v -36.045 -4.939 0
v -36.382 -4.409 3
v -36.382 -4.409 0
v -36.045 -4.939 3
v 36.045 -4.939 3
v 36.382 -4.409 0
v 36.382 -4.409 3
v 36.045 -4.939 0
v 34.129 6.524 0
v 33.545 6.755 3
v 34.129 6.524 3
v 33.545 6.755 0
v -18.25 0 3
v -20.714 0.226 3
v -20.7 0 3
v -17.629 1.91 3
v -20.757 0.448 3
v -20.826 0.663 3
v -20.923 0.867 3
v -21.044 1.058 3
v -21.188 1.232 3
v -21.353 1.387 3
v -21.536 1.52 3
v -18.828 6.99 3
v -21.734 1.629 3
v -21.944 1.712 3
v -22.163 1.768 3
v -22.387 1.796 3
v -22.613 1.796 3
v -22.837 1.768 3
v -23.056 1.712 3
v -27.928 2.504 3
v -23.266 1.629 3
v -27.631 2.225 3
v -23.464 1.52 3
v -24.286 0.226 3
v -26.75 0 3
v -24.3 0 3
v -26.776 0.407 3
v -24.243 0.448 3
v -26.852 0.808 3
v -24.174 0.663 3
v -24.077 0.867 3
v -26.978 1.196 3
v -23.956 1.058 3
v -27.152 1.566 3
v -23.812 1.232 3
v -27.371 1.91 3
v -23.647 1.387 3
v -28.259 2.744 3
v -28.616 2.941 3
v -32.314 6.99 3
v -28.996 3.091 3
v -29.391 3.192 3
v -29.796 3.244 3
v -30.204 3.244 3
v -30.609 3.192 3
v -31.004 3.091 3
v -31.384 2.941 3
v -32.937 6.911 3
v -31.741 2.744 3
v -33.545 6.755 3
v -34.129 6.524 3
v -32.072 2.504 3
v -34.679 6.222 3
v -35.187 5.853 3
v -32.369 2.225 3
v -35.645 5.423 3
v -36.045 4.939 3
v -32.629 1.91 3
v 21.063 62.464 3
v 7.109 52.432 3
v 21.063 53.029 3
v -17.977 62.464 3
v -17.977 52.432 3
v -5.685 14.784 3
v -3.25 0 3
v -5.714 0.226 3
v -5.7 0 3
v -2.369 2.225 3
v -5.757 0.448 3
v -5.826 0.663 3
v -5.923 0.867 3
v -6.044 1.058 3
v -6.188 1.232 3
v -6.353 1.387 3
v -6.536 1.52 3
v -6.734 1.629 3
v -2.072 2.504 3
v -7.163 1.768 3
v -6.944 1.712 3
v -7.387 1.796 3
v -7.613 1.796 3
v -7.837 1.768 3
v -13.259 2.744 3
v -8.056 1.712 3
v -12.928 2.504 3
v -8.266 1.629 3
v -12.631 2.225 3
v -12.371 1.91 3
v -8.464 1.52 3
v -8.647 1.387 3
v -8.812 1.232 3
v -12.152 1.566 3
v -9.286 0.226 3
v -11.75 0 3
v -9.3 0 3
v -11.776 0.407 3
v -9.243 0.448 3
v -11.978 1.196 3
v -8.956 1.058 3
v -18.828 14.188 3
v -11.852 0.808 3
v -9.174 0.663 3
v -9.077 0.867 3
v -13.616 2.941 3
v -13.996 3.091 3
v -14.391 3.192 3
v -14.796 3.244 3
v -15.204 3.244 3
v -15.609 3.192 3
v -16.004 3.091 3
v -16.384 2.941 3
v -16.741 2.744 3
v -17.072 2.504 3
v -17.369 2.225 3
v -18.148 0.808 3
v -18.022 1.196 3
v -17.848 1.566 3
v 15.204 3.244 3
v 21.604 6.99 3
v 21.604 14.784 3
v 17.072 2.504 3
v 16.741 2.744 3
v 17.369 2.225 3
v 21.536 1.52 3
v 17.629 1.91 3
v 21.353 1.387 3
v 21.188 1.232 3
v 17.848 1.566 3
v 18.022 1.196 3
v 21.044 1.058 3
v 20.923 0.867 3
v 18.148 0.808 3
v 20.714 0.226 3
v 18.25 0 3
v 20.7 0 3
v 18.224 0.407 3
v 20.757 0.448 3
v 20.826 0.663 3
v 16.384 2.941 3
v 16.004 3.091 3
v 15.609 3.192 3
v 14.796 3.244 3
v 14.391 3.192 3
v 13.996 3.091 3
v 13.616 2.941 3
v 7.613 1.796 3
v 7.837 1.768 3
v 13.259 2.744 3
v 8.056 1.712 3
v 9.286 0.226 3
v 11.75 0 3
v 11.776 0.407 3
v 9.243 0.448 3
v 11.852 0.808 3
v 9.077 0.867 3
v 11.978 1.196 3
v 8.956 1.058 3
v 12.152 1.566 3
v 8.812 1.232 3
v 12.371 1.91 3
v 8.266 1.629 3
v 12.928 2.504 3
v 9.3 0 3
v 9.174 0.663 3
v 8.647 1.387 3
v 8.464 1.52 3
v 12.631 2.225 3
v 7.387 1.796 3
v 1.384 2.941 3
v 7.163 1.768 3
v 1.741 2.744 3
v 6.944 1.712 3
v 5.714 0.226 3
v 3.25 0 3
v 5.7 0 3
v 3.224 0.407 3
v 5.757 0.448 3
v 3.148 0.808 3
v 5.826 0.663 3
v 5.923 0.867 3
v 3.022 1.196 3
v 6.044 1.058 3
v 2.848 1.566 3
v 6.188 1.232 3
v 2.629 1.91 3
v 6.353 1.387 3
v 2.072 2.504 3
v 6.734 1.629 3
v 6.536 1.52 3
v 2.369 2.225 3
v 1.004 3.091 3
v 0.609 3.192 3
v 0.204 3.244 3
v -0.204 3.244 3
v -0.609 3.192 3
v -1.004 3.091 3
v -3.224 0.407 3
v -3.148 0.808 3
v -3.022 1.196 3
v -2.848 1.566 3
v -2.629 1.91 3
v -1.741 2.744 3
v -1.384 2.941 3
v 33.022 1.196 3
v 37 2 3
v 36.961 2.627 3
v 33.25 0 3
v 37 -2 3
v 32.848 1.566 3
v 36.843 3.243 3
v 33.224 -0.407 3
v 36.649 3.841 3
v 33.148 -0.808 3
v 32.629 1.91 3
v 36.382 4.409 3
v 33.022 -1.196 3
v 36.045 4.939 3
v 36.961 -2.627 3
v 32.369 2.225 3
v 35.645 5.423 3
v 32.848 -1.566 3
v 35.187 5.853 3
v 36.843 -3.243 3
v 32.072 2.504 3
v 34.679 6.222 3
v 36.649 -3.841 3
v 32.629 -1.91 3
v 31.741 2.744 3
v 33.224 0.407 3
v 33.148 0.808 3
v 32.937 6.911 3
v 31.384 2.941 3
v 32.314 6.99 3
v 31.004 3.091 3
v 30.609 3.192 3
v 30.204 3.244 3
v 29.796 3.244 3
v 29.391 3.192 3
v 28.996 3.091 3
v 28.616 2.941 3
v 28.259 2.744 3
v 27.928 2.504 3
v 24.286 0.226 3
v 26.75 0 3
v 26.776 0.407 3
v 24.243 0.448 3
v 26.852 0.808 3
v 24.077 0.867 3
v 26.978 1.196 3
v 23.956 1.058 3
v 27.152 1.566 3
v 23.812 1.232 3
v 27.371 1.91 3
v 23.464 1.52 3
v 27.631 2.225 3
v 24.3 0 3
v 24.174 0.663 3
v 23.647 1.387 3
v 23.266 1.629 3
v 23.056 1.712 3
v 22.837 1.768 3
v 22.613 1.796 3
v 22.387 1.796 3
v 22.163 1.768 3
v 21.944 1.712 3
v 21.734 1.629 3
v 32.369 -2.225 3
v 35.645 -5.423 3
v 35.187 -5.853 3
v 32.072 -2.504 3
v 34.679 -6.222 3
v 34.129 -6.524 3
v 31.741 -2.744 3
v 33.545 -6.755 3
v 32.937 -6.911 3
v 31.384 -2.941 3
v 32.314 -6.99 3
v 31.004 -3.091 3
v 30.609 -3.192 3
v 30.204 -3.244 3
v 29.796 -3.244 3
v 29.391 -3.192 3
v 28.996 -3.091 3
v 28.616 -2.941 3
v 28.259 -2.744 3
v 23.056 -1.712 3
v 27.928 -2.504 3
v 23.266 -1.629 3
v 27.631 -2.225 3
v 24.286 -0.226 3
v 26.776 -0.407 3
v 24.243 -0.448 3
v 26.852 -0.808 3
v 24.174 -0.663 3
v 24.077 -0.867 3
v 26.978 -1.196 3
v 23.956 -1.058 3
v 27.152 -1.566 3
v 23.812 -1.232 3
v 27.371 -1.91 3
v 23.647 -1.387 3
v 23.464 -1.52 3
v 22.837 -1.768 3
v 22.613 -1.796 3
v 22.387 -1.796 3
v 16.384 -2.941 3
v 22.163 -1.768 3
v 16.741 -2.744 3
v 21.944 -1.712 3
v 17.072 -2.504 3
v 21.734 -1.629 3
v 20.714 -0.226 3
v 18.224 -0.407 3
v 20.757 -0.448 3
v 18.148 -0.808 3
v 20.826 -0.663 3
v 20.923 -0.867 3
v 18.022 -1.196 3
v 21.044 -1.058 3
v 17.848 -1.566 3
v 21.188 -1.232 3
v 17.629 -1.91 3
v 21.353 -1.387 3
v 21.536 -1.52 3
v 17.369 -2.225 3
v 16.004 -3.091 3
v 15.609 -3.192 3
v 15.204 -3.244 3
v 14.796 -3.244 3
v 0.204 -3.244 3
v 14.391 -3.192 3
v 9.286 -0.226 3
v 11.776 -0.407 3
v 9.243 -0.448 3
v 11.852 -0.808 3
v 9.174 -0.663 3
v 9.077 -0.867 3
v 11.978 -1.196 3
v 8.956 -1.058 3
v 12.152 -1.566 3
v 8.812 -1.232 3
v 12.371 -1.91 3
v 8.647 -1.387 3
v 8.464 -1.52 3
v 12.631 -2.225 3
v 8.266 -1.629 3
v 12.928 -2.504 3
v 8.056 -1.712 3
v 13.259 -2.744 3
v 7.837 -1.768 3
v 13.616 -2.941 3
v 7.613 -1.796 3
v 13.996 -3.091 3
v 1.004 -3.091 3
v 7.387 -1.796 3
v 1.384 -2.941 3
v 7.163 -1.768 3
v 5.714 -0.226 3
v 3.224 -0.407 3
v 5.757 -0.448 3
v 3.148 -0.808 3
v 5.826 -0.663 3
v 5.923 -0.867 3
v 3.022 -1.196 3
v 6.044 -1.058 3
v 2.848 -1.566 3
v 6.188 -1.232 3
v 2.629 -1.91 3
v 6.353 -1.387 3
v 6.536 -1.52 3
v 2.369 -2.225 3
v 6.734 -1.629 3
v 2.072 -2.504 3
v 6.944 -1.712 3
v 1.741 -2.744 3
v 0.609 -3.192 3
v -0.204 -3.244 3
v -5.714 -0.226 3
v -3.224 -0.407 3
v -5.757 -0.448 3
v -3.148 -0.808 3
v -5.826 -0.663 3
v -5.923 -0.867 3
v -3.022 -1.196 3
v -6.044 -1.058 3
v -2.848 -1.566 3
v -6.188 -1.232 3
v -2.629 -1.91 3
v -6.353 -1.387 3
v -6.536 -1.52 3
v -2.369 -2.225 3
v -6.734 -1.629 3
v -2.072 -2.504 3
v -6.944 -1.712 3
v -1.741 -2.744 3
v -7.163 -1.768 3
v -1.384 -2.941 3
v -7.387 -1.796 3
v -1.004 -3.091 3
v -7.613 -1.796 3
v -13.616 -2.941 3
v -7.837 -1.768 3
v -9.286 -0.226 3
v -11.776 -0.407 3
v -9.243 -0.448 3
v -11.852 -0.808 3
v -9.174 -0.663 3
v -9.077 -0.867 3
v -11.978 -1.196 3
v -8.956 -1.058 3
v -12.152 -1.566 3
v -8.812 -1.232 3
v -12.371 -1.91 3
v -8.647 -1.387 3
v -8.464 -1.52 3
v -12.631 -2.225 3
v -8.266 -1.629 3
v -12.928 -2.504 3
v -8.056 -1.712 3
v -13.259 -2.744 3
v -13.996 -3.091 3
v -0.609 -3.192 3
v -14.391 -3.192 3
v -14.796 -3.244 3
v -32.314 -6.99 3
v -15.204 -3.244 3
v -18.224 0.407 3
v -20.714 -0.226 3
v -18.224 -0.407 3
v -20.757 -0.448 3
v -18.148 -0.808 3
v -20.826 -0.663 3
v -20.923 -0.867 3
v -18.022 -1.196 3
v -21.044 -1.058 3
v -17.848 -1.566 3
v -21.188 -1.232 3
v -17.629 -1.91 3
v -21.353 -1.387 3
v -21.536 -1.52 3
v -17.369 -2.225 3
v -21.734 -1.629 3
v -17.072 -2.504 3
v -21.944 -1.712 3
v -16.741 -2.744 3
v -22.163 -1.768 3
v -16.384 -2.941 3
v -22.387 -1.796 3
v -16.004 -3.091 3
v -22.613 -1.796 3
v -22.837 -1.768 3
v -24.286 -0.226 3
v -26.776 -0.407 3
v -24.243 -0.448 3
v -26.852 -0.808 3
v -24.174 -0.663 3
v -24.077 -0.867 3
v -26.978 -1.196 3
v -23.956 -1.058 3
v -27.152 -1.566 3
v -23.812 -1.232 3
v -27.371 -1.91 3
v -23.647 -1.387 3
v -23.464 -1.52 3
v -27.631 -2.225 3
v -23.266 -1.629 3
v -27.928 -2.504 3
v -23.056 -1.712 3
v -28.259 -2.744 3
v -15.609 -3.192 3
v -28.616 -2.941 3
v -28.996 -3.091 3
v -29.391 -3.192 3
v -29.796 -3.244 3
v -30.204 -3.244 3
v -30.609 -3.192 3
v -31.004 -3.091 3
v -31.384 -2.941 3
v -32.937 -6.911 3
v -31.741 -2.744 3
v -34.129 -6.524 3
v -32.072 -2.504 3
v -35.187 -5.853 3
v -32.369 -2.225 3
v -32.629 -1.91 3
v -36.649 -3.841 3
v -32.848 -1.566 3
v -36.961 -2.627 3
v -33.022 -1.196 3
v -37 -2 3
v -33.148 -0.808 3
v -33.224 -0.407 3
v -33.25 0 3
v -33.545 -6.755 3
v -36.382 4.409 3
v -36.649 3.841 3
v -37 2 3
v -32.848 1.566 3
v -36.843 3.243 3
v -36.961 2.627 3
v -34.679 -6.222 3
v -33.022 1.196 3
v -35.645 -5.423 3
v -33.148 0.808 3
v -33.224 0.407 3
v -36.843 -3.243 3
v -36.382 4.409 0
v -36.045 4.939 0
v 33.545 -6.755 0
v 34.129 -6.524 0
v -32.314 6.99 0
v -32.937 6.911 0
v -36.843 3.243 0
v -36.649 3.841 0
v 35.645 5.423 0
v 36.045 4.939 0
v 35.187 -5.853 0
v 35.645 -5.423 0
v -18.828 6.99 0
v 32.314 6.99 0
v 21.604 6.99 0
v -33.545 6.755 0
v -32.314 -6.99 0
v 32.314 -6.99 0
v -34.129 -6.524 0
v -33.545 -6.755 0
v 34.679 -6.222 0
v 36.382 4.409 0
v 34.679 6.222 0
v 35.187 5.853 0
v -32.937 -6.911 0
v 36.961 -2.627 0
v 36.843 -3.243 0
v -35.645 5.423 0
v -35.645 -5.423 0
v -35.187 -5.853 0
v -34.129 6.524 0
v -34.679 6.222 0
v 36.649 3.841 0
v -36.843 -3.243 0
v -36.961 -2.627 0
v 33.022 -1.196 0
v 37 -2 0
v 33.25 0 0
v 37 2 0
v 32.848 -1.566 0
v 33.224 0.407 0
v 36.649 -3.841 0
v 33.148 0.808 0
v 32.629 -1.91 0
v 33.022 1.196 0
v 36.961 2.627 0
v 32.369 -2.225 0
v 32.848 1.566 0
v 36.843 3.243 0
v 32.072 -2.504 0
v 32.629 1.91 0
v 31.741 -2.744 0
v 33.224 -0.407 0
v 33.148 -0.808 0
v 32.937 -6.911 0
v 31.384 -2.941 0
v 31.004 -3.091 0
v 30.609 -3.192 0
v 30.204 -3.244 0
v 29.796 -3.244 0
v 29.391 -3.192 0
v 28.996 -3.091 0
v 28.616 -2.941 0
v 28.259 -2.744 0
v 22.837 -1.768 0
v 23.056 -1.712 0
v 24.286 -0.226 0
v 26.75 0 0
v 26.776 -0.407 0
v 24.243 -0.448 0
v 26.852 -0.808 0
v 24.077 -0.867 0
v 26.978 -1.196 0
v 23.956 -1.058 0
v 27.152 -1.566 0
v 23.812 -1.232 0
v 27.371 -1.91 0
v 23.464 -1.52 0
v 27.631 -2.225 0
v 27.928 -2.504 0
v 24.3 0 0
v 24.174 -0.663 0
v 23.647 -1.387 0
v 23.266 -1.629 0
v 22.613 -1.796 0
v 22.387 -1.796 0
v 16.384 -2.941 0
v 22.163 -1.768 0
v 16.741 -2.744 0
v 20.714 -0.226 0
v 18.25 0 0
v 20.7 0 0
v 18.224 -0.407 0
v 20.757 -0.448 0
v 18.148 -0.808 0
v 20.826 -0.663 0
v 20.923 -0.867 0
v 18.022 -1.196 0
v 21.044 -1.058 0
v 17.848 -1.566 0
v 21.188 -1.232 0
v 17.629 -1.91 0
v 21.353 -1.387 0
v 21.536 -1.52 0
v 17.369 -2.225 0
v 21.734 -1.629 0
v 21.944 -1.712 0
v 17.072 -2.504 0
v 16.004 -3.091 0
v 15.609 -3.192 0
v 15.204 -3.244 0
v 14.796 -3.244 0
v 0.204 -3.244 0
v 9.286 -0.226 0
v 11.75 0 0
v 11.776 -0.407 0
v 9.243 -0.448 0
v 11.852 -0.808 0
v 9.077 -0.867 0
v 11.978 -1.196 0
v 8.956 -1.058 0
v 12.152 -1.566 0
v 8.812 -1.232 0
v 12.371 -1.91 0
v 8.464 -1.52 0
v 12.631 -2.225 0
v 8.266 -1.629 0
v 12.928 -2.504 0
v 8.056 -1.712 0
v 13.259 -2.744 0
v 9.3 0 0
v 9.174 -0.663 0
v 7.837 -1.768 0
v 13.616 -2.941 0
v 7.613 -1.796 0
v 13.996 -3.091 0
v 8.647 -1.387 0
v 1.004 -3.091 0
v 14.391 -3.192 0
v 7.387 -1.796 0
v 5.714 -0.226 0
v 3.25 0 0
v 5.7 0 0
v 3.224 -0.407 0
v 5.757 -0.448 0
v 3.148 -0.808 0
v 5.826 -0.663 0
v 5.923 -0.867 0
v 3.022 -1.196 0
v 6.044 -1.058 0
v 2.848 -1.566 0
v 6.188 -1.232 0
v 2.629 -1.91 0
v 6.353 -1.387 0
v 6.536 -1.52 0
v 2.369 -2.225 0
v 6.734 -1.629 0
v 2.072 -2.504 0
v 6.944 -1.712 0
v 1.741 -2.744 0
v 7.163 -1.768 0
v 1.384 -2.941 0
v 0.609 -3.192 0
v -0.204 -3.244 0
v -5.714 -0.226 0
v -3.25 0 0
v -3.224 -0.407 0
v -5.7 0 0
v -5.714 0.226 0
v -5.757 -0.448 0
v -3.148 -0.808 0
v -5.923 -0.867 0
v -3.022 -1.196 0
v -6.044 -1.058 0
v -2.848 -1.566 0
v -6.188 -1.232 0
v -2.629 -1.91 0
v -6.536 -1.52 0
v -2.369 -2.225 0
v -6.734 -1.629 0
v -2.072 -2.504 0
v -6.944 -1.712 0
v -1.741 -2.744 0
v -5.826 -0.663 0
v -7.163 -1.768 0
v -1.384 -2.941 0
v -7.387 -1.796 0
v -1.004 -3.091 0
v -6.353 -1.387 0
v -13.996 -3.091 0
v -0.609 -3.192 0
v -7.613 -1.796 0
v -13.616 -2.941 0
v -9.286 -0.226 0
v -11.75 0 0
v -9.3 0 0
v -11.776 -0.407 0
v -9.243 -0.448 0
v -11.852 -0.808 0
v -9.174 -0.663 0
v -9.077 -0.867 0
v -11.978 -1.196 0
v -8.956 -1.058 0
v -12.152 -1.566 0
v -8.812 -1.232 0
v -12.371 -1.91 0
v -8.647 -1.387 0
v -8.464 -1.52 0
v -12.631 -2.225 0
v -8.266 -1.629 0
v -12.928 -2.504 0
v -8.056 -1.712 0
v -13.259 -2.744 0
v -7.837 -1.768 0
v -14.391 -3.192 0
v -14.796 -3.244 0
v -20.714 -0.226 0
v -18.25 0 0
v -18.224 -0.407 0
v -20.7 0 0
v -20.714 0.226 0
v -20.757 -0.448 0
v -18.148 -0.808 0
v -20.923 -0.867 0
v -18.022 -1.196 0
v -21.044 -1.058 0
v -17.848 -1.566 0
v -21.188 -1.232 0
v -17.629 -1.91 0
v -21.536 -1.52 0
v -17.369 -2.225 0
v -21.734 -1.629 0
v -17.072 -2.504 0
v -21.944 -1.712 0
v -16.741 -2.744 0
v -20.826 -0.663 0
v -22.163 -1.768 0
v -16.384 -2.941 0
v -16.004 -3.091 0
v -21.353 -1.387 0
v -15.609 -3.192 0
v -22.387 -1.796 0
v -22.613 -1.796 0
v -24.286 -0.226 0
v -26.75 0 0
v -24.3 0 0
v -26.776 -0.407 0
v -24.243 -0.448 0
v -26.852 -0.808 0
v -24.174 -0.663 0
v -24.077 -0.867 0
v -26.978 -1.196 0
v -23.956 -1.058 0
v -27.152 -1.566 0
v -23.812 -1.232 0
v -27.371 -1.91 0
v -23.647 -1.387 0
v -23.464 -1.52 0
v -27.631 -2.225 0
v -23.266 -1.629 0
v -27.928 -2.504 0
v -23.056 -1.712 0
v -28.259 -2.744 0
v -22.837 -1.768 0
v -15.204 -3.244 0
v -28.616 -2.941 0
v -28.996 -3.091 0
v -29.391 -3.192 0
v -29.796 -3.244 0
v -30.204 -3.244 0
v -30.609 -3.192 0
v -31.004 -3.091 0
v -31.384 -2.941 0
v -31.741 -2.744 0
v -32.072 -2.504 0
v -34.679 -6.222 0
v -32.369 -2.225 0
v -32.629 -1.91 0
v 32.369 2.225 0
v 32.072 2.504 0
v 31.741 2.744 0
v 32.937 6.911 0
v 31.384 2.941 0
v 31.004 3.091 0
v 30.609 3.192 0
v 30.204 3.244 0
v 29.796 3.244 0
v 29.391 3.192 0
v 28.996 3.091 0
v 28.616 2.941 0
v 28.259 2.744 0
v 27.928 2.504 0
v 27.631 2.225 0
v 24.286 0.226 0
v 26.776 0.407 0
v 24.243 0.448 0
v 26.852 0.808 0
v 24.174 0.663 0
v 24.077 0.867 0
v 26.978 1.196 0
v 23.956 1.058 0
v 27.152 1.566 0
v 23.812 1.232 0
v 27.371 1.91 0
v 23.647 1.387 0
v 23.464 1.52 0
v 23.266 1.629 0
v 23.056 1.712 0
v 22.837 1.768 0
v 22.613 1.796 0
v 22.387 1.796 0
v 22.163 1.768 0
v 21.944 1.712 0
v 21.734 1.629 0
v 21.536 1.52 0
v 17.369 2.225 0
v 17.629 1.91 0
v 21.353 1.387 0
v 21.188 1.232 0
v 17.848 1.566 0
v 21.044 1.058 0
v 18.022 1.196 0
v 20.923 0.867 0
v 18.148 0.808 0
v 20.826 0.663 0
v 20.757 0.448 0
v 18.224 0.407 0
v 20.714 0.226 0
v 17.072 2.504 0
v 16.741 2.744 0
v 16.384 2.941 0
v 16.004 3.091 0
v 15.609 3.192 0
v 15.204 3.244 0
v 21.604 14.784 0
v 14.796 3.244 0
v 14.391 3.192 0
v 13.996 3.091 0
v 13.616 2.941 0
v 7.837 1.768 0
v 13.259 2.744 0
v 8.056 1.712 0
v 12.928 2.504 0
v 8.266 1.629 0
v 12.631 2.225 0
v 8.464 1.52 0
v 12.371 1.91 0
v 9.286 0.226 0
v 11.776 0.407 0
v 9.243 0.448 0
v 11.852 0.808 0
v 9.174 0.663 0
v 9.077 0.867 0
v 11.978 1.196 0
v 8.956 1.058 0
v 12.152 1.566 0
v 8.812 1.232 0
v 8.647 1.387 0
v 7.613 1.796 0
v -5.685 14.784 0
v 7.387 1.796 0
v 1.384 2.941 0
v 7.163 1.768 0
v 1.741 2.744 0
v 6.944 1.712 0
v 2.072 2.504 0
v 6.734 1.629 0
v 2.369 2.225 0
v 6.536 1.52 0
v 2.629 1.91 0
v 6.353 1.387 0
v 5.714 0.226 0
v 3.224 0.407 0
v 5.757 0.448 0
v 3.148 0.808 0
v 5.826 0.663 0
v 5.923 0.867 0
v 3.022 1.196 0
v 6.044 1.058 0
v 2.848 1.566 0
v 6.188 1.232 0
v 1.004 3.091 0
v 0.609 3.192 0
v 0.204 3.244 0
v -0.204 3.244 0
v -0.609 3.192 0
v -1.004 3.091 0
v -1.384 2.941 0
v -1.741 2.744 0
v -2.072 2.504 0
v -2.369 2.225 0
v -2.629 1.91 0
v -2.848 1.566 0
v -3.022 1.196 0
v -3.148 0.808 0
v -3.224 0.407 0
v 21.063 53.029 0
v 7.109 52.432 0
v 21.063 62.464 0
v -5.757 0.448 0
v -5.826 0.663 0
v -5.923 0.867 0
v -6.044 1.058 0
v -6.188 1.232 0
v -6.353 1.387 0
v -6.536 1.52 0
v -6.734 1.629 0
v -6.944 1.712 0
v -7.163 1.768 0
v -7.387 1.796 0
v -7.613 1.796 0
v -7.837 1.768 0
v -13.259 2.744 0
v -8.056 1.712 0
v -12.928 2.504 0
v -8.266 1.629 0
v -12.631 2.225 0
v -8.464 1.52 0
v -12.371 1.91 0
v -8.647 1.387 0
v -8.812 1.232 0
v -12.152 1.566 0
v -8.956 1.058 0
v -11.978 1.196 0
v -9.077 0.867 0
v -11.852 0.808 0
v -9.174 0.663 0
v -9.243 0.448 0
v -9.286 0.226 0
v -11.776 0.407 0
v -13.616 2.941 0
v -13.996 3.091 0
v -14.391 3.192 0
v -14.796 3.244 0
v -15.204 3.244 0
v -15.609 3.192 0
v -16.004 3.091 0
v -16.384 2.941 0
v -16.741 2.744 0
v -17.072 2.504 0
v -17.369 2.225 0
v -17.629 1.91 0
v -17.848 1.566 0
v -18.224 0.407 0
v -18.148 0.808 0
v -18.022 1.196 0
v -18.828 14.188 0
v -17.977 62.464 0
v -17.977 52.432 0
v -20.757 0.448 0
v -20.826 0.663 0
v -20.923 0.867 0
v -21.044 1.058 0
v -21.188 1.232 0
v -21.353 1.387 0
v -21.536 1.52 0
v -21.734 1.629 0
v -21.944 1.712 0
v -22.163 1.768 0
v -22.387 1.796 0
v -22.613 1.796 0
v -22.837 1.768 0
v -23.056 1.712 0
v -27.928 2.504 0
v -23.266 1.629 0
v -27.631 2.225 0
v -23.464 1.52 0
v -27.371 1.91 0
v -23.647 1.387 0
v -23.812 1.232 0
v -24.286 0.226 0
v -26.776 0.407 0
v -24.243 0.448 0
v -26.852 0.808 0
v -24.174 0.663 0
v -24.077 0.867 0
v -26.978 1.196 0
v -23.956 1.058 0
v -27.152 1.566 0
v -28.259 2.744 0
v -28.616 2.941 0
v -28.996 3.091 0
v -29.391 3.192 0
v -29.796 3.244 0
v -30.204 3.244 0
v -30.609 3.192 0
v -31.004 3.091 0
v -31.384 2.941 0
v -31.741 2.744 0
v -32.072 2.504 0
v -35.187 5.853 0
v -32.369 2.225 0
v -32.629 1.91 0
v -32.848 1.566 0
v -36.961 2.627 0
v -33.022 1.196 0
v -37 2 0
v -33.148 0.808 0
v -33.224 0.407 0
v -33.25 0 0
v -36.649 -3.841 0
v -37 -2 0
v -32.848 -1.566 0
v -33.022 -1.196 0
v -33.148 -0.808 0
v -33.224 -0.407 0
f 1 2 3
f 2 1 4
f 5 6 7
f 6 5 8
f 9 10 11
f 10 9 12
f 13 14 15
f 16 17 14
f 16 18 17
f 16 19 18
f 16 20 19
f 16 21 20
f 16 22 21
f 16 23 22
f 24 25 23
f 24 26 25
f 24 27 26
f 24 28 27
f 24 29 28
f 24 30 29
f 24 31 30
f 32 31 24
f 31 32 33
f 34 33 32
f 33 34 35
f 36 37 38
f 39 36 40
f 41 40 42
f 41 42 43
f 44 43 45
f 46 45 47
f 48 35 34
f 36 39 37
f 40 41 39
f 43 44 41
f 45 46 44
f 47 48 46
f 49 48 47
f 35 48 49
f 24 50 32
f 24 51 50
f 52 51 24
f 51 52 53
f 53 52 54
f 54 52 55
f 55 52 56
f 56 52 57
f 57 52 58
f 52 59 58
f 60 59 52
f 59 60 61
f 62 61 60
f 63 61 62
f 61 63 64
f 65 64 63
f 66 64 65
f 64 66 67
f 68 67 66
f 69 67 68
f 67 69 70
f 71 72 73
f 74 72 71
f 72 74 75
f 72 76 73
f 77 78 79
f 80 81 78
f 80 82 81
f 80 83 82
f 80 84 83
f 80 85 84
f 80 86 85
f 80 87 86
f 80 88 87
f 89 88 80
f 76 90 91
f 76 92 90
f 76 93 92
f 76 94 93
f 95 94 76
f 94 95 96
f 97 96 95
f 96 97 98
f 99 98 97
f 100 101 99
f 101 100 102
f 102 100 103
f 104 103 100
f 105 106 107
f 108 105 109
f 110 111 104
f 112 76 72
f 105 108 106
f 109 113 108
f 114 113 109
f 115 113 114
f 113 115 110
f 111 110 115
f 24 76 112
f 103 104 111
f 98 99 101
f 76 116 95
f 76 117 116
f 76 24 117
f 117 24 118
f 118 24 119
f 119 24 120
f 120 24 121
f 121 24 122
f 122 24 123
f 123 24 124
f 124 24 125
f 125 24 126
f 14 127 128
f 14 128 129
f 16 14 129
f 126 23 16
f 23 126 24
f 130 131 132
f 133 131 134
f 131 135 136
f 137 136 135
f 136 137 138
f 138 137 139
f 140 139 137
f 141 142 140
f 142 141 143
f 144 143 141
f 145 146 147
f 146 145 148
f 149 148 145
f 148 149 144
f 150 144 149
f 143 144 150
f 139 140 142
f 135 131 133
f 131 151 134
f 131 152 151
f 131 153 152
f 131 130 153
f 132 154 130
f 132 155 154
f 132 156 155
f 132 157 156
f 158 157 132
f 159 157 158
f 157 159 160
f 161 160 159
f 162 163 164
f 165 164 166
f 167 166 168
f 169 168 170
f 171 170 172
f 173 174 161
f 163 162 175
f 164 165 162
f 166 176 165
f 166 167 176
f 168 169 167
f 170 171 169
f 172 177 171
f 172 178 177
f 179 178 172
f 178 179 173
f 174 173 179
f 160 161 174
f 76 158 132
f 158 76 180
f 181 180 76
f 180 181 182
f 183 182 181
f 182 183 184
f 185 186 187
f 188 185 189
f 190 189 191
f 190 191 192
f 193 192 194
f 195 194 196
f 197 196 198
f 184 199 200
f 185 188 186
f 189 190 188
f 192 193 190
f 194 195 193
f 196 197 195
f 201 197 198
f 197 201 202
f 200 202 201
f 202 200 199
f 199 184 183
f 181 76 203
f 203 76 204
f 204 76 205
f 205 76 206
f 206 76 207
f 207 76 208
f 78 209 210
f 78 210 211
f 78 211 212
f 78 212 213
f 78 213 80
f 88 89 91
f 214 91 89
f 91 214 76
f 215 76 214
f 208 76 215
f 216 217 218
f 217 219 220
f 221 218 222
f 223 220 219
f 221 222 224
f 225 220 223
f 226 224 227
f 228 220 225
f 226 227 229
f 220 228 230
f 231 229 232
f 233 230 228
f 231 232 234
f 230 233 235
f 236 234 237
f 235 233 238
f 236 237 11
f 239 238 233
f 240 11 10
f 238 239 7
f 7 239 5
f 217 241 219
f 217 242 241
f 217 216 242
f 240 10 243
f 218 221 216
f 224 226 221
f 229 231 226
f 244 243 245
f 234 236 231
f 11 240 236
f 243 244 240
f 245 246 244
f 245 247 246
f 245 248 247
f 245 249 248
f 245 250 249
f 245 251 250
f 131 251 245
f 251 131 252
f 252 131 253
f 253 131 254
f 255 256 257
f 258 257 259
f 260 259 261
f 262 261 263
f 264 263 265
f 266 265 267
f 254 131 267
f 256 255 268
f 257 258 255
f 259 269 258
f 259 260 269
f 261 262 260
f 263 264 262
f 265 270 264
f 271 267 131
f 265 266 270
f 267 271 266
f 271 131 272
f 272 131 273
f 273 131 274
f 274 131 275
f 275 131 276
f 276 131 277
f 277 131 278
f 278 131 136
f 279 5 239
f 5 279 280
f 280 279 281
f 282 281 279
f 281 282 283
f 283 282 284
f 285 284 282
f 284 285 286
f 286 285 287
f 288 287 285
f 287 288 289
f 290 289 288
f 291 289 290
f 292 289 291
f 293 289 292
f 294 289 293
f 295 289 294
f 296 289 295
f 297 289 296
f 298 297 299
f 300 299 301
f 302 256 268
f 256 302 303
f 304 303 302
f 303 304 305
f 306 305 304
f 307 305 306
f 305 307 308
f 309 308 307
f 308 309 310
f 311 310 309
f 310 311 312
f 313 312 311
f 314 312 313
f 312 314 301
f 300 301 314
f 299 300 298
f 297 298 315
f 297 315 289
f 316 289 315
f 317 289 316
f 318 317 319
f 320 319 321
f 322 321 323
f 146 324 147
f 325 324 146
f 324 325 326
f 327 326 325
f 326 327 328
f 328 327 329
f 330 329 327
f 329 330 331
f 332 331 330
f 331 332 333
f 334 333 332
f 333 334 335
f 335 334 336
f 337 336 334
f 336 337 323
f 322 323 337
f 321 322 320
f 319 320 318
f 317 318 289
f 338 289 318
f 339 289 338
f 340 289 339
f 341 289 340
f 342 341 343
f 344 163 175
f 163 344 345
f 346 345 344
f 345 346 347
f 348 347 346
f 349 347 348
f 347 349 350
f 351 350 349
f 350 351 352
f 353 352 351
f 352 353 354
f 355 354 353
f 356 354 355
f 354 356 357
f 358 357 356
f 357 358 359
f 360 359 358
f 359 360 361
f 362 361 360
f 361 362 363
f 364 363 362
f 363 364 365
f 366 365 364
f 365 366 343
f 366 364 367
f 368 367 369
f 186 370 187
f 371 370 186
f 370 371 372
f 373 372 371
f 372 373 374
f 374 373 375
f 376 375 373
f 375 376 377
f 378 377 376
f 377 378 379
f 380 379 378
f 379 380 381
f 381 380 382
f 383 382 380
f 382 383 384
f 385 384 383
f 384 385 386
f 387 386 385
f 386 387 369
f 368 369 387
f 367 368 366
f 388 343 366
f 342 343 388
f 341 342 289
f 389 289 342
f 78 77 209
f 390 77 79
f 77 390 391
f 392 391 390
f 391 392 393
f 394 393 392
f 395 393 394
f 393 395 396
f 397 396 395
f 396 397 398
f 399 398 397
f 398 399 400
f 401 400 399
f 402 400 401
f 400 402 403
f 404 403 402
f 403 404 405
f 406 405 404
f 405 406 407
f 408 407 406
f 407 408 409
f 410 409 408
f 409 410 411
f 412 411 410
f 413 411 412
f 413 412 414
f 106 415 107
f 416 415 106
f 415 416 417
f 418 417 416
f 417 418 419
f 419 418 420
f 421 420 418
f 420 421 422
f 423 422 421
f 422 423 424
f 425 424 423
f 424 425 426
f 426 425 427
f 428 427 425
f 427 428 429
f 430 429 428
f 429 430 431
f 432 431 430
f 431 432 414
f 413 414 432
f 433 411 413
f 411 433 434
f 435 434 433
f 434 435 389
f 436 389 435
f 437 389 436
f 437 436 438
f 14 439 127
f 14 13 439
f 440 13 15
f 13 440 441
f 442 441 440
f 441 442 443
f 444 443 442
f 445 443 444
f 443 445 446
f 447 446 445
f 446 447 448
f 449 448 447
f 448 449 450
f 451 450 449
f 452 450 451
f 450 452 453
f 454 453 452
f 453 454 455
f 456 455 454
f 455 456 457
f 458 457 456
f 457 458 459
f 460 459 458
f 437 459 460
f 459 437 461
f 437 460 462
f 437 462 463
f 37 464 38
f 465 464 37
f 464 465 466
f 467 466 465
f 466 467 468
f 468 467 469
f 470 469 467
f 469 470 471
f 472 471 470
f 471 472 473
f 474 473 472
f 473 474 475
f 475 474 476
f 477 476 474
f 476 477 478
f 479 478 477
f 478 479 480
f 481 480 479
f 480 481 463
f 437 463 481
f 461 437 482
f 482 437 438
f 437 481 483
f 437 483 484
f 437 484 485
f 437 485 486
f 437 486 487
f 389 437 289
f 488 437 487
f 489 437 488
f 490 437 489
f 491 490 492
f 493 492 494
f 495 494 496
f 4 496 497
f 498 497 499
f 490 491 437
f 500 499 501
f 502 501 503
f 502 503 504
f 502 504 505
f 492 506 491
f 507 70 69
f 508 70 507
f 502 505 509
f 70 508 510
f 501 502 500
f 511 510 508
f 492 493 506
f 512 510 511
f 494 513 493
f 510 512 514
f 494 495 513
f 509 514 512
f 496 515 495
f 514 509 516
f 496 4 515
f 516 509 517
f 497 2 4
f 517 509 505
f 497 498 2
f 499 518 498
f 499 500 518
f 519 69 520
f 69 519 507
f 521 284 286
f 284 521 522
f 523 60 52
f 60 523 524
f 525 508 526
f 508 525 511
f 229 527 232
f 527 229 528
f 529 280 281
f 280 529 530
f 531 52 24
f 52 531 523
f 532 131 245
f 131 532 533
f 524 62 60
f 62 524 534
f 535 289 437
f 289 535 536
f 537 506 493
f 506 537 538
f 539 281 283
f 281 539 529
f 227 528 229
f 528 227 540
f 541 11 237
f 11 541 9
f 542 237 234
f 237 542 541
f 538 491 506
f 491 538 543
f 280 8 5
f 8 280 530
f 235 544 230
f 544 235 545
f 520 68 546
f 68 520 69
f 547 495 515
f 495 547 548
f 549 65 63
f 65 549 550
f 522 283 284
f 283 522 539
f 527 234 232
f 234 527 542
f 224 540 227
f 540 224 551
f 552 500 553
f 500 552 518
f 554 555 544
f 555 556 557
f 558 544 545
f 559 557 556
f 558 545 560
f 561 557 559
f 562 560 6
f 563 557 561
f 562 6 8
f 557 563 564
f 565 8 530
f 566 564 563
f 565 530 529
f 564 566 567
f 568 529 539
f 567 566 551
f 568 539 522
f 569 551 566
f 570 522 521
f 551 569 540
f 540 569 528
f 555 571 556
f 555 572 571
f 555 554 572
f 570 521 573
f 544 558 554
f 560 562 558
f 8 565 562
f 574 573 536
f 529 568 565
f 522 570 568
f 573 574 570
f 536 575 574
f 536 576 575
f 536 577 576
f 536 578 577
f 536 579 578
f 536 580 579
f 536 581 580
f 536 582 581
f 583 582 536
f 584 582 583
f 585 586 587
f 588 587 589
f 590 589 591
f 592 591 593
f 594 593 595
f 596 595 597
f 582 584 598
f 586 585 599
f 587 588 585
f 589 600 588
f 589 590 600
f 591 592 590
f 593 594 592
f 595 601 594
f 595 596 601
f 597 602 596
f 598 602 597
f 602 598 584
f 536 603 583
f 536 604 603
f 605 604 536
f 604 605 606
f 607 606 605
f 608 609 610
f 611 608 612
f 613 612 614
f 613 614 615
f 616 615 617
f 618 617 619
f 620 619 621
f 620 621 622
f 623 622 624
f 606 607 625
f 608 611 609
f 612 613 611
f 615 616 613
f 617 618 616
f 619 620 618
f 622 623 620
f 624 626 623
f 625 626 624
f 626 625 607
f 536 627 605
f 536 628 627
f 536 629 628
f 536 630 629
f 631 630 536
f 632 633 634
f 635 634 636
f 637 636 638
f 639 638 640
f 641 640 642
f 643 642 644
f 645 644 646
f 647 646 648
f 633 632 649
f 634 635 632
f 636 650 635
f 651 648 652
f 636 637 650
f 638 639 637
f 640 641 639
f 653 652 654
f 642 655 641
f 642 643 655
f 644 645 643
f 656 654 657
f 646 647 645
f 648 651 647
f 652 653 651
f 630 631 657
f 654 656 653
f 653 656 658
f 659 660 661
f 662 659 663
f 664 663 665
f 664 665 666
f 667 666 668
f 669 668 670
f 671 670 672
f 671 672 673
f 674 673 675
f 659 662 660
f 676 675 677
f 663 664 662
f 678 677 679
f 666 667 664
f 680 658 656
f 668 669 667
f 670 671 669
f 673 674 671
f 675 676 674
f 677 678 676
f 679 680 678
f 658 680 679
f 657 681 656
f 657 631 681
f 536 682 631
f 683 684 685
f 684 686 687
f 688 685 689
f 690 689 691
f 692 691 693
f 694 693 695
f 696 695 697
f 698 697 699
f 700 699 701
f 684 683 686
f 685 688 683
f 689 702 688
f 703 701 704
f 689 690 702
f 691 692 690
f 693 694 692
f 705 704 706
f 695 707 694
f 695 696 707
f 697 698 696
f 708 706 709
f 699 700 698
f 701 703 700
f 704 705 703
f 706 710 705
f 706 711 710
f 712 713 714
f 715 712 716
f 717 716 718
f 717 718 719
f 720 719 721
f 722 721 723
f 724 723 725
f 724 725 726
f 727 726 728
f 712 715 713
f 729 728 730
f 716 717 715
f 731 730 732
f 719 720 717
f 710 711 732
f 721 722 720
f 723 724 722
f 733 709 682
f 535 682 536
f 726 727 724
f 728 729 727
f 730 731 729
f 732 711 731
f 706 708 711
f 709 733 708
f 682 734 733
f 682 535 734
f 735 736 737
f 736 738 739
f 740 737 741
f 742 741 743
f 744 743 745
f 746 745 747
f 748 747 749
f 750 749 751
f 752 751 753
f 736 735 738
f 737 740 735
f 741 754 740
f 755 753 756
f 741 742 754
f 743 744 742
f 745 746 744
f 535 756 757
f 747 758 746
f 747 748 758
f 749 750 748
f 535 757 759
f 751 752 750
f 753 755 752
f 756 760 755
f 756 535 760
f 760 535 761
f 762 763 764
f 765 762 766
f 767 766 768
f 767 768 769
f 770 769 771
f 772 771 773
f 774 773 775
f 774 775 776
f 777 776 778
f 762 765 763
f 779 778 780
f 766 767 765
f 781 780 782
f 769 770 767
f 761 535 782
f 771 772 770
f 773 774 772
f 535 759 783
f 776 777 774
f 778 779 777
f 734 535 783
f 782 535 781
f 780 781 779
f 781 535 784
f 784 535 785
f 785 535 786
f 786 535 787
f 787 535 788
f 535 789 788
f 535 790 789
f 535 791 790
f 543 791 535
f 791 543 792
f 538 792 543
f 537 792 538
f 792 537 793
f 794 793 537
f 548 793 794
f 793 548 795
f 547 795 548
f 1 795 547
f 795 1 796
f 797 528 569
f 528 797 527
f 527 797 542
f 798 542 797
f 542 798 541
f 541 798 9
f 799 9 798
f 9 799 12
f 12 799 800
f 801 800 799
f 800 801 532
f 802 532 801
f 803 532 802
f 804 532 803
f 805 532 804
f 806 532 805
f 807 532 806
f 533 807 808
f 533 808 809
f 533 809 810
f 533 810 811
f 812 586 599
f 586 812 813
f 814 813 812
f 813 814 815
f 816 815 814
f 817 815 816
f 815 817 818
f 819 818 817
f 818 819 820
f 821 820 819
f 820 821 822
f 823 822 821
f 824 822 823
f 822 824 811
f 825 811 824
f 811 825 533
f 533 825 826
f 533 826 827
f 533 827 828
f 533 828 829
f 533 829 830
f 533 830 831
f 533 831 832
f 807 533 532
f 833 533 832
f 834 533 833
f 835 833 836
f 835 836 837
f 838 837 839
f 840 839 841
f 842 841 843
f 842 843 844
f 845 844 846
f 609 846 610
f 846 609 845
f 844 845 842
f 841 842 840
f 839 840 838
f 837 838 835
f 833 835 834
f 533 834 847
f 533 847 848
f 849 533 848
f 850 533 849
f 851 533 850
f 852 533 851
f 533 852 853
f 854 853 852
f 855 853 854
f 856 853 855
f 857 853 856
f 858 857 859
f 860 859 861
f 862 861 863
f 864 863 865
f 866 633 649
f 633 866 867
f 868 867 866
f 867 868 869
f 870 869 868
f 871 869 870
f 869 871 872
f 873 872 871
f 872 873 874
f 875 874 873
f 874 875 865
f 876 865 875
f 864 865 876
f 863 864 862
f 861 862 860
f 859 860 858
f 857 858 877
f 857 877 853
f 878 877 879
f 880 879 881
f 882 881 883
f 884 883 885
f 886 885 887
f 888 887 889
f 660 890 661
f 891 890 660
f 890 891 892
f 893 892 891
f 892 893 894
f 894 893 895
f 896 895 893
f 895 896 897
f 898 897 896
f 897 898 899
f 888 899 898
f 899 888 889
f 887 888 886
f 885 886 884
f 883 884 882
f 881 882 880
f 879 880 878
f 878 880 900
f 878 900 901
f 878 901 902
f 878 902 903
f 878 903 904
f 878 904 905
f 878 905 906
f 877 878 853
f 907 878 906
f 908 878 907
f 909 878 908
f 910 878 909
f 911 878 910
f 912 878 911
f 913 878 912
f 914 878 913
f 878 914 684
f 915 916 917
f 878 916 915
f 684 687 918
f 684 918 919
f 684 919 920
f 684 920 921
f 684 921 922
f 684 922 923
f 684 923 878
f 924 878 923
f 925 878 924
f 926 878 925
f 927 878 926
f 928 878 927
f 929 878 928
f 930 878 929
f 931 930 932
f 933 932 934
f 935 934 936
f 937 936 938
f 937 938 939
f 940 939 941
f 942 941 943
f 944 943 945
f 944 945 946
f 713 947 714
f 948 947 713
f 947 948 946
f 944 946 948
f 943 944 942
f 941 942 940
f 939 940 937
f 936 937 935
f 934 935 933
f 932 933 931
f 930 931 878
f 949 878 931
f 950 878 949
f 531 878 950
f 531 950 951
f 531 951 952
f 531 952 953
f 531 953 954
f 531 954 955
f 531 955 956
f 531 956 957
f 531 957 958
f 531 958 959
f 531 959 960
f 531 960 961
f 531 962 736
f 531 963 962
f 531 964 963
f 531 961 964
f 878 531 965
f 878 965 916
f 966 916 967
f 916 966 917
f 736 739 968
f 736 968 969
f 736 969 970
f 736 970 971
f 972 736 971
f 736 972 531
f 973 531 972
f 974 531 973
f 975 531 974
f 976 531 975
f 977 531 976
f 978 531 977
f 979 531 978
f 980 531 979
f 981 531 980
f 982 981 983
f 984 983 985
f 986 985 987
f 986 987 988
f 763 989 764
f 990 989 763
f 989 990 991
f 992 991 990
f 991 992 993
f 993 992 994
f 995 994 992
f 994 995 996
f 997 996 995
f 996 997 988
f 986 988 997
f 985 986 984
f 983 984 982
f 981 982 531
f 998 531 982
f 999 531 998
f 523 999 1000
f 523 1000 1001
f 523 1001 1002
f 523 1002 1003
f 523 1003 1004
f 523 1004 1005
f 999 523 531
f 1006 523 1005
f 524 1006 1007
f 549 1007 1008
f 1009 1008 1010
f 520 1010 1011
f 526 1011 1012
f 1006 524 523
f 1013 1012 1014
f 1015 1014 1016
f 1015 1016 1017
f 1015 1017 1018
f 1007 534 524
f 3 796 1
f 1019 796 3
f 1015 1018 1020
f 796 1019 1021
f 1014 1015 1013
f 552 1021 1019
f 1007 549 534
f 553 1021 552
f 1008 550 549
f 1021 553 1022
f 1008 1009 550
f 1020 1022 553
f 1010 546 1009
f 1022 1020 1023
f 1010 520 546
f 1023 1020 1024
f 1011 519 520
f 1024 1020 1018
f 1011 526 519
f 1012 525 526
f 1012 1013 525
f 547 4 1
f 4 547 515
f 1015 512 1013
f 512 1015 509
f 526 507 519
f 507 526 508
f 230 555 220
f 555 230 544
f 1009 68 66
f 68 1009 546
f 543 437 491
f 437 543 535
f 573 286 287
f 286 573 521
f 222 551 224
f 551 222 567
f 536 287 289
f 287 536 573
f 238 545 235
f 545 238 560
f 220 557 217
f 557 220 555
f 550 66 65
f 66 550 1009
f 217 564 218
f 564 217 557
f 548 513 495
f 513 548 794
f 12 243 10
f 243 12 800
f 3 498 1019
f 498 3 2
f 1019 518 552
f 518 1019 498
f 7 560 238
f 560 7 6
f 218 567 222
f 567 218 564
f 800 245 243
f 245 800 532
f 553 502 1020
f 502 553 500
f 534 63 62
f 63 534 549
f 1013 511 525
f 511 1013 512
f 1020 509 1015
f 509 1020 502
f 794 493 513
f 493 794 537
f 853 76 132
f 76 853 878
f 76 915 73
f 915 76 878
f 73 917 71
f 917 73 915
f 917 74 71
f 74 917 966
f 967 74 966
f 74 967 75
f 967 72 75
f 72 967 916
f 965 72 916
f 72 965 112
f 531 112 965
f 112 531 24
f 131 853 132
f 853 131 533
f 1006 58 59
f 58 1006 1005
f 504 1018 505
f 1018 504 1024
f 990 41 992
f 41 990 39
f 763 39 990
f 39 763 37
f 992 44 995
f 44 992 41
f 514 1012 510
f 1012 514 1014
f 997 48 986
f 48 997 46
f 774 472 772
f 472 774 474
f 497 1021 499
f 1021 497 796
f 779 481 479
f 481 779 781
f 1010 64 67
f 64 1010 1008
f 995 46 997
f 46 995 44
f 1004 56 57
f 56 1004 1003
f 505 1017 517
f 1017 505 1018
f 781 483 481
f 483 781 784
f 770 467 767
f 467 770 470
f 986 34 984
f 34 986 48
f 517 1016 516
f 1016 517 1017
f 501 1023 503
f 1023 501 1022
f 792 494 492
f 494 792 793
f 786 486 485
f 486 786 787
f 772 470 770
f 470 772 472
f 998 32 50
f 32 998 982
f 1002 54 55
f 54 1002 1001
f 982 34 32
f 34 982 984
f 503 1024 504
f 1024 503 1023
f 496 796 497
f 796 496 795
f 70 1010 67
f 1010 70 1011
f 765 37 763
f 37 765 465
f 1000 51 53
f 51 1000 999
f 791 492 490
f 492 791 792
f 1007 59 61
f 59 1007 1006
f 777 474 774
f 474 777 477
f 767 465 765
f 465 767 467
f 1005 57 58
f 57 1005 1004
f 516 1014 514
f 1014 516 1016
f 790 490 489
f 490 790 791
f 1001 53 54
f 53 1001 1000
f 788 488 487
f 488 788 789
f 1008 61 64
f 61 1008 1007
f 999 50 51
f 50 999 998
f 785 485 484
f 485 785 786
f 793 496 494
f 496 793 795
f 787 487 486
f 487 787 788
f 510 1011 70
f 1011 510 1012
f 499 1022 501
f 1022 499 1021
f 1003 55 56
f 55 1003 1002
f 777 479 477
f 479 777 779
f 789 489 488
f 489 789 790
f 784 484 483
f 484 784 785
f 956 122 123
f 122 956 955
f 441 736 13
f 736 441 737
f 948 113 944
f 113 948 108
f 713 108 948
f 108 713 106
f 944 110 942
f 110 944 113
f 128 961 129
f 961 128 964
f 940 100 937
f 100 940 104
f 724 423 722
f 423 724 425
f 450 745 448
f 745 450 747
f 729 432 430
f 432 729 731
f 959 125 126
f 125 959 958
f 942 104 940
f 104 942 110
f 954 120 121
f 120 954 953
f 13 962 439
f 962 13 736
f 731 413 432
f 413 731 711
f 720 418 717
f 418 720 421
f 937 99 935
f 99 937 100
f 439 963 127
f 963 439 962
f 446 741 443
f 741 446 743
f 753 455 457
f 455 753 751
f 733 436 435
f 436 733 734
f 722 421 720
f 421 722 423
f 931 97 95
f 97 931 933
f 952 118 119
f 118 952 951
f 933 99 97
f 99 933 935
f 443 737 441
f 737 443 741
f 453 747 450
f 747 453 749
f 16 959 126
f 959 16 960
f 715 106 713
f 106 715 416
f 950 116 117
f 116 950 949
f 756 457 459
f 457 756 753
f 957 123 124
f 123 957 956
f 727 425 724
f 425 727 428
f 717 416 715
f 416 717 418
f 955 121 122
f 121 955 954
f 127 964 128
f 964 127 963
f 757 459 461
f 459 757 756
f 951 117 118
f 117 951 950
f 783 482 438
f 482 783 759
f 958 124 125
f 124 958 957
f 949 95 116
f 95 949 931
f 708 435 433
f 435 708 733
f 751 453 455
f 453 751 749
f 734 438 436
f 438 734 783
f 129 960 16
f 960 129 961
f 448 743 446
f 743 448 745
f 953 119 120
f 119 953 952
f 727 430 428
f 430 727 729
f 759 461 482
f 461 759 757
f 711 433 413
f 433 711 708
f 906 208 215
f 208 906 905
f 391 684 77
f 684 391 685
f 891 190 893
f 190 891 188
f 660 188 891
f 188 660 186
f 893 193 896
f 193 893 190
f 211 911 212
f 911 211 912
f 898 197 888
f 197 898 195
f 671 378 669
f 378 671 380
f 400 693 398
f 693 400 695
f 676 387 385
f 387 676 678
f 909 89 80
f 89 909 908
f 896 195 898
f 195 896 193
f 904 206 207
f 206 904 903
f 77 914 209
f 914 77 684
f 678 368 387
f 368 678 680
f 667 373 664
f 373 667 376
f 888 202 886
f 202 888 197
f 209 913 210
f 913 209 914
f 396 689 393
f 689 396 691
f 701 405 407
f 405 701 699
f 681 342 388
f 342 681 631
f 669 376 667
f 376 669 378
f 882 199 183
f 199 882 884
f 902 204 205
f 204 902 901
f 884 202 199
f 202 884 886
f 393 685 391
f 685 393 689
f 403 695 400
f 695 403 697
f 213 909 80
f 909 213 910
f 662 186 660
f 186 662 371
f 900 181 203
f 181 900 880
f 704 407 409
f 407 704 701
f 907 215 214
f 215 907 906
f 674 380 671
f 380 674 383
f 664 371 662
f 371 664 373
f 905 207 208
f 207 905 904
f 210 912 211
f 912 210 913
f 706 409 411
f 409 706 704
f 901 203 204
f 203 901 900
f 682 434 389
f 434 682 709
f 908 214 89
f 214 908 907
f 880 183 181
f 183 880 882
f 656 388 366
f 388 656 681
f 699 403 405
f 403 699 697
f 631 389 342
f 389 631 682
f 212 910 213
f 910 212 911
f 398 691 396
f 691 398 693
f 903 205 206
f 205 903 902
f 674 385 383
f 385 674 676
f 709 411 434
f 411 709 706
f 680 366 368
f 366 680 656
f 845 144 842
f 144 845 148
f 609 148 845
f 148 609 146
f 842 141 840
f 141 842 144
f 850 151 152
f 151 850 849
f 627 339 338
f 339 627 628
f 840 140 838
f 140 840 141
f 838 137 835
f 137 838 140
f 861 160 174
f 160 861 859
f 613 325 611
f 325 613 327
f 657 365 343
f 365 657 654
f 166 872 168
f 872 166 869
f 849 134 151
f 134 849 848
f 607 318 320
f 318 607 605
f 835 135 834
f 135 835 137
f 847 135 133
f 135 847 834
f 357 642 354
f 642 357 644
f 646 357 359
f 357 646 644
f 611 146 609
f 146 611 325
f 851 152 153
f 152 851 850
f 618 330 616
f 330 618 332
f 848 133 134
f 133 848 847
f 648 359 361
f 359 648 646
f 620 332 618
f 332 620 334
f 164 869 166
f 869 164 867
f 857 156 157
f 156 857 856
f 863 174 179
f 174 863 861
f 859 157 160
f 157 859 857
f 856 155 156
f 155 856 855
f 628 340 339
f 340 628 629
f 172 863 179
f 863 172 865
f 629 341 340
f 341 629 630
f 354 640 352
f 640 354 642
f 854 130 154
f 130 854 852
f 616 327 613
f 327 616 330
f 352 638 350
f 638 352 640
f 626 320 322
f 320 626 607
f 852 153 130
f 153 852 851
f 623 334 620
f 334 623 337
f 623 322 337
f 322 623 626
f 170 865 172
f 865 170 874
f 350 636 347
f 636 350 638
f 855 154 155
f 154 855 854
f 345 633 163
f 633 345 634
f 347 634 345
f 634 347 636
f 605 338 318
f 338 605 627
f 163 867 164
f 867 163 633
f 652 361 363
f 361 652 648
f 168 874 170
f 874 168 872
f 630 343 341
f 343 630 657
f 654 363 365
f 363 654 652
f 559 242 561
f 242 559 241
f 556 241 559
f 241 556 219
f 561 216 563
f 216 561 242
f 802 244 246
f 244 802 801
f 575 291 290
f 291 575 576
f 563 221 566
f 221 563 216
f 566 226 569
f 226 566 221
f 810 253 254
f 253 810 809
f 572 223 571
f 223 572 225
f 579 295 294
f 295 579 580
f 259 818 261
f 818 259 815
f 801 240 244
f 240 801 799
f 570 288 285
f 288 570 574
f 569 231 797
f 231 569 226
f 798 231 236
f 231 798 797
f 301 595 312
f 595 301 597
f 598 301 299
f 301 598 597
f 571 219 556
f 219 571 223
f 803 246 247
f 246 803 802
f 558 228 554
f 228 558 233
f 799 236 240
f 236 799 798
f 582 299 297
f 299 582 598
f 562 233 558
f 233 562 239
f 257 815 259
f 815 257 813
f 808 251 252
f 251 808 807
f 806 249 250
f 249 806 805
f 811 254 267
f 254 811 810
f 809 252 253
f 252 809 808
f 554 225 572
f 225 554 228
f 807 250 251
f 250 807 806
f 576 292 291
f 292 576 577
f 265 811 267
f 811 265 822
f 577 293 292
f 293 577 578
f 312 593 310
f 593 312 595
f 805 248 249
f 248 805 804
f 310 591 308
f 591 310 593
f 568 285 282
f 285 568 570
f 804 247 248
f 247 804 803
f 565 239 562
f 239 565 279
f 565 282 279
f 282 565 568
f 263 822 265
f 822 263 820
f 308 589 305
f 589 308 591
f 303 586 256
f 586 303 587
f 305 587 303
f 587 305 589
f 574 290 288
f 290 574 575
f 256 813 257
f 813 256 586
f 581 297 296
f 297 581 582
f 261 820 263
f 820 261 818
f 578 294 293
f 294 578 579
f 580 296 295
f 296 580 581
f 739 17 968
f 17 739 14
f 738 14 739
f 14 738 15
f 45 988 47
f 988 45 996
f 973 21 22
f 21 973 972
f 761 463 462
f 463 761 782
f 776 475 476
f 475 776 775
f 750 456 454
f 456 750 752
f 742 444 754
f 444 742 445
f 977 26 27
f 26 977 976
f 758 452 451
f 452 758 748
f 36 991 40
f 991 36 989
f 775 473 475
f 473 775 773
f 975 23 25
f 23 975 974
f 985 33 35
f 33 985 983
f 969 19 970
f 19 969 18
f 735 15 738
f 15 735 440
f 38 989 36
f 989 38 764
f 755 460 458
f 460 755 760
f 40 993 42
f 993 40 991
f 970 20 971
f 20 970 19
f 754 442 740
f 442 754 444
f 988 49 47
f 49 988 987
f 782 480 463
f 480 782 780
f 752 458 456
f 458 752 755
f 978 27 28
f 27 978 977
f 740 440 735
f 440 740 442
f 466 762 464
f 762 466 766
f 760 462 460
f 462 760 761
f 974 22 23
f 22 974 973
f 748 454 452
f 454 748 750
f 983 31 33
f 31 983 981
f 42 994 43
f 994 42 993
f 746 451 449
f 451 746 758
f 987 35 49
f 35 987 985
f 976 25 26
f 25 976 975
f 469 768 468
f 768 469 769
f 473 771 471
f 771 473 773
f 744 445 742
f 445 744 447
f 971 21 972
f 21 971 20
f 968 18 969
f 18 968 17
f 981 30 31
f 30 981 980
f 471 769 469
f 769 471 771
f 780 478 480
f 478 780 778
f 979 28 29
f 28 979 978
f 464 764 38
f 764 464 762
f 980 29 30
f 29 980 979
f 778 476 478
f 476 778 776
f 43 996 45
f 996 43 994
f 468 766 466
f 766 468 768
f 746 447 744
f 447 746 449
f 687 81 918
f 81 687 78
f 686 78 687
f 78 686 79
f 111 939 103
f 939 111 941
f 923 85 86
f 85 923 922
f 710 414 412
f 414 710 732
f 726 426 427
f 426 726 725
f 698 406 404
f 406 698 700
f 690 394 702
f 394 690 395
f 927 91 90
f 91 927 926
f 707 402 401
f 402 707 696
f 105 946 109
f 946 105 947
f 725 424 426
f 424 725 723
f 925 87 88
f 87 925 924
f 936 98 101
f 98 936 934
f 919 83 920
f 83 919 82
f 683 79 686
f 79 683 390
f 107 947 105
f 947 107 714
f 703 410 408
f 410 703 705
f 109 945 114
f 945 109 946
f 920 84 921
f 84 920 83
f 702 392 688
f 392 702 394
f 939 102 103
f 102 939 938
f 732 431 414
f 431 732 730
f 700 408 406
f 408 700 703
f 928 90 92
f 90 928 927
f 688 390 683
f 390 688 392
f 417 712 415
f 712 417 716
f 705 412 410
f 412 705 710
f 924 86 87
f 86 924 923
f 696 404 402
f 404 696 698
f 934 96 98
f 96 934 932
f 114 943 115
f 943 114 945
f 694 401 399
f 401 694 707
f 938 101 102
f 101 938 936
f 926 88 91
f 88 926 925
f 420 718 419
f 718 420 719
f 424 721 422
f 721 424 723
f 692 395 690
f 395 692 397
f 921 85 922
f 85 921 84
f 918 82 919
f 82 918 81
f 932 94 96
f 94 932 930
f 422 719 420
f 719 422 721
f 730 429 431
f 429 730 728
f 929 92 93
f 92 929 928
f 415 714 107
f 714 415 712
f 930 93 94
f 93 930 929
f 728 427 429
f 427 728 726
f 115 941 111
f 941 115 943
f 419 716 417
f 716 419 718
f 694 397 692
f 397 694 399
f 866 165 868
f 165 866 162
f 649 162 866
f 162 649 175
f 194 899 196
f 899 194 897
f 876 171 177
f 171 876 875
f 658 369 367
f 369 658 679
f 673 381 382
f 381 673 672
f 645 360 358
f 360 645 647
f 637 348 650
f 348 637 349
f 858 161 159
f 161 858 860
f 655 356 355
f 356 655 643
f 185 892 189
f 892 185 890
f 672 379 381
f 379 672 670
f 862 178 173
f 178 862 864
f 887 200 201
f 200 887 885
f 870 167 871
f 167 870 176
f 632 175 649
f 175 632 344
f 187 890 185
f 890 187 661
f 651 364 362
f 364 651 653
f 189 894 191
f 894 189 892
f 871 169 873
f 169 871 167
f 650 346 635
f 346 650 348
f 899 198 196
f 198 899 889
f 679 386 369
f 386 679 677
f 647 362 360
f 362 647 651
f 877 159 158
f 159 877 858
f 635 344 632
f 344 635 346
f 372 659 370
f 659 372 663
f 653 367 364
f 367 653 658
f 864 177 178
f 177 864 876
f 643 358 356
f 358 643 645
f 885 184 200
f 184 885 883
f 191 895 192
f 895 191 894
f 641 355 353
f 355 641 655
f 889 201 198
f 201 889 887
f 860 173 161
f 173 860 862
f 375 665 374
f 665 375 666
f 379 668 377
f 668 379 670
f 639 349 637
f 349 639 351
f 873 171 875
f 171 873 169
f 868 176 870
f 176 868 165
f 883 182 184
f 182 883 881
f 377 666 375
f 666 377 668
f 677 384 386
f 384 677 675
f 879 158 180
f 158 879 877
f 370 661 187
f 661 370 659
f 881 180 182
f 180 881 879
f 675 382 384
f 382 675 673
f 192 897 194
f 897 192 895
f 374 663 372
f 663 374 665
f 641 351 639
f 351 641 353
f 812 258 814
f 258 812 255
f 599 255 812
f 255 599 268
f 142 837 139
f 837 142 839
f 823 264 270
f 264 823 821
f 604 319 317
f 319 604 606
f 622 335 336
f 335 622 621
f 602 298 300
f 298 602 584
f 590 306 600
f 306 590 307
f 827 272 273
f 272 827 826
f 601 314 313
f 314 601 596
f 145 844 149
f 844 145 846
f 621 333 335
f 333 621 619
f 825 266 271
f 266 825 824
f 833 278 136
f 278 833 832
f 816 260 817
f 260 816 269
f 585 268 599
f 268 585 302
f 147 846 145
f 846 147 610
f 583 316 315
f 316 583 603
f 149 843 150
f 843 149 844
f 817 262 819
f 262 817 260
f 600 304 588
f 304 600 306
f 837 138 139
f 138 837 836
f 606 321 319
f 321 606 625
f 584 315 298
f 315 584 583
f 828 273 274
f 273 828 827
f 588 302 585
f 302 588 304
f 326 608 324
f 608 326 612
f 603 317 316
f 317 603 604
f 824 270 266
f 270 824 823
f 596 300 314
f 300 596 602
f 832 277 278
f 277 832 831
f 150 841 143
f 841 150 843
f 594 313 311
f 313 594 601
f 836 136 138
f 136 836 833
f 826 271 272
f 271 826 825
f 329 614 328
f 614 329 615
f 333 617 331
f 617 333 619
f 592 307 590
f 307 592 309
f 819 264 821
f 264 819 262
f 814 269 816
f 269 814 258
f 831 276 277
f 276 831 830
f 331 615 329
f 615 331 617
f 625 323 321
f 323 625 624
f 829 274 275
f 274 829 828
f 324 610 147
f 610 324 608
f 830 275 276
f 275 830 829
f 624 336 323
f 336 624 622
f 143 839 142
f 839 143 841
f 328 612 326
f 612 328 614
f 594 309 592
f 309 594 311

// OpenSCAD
$fn = 50;


difference() {
	union() {
		hull() {
			translate(v = [-32.0000000000, 2.0000000000, 0]) {
				cylinder(h = 3, r = 5);
			}
			translate(v = [32.0000000000, 2.0000000000, 0]) {
				cylinder(h = 3, r = 5);
			}
			translate(v = [-32.0000000000, -2.0000000000, 0]) {
				cylinder(h = 3, r = 5);
			}
			translate(v = [32.0000000000, -2.0000000000, 0]) {
				cylinder(h = 3, r = 5);
			}
		}
		translate(v = [0, 61.1111111111, 0]) {
			linear_extrude(height = 3) {
				text(font = "DejaVu Sans Mono:style=Bold", halign = "center", size = 57.0000000000, text = "Z", valign = "top");
			}
		}
	}
	union() {
		translate(v = [-30.0000000000, 0.0000000000, 0]) {
			translate(v = [0, 0, -100]) {
				cylinder(h = 200, r = 3.2500000000);
			}
		}
		translate(v = [-15.0000000000, 0.0000000000, 0]) {
			translate(v = [0, 0, -100]) {
				cylinder(h = 200, r = 3.2500000000);
			}
		}
		translate(v = [0, 0, -100]) {
			cylinder(h = 200, r = 3.2500000000);
		}
		translate(v = [15.0000000000, 0.0000000000, 0]) {
			translate(v = [0, 0, -100]) {
				cylinder(h = 200, r = 3.2500000000);
			}
		}
		translate(v = [30.0000000000, 0.0000000000, 0]) {
			translate(v = [0, 0, -100]) {
				cylinder(h = 200, r = 3.2500000000);
			}
		}
		translate(v = [-30.0000000000, 0.0000000000, 0]) {
			translate(v = [0, 0, -100]) {
				cylinder(h = 200, r = 1.8000000000);
			}
		}
		translate(v = [-22.5000000000, 0.0000000000, 0]) {
			translate(v = [0, 0, -100]) {
				cylinder(h = 200, r = 1.8000000000);
			}
		}
		translate(v = [-15.0000000000, 0.0000000000, 0]) {
			translate(v = [0, 0, -100]) {
				cylinder(h = 200, r = 1.8000000000);
			}
		}
		translate(v = [-7.5000000000, 0.0000000000, 0]) {
			translate(v = [0, 0, -100]) {
				cylinder(h = 200, r = 1.8000000000);
			}
		}
		translate(v = [0, 0, -100]) {
			cylinder(h = 200, r = 1.8000000000);
		}
		translate(v = [7.5000000000, 0.0000000000, 0]) {
			translate(v = [0, 0, -100]) {
				cylinder(h = 200, r = 1.8000000000);
			}
		}
		translate(v = [15.0000000000, 0.0000000000, 0]) {
			translate(v = [0, 0, -100]) {
				cylinder(h = 200, r = 1.8000000000);
			}
		}
		translate(v = [22.5000000000, 0.0000000000, 0]) {
			translate(v = [0, 0, -100]) {
				cylinder(h = 200, r = 1.8000000000);
			}
		}
		translate(v = [30.0000000000, 0.0000000000, 0]) {
			translate(v = [0, 0, -100]) {
				cylinder(h = 200, r = 1.8000000000);
			}
		}
	}
}
